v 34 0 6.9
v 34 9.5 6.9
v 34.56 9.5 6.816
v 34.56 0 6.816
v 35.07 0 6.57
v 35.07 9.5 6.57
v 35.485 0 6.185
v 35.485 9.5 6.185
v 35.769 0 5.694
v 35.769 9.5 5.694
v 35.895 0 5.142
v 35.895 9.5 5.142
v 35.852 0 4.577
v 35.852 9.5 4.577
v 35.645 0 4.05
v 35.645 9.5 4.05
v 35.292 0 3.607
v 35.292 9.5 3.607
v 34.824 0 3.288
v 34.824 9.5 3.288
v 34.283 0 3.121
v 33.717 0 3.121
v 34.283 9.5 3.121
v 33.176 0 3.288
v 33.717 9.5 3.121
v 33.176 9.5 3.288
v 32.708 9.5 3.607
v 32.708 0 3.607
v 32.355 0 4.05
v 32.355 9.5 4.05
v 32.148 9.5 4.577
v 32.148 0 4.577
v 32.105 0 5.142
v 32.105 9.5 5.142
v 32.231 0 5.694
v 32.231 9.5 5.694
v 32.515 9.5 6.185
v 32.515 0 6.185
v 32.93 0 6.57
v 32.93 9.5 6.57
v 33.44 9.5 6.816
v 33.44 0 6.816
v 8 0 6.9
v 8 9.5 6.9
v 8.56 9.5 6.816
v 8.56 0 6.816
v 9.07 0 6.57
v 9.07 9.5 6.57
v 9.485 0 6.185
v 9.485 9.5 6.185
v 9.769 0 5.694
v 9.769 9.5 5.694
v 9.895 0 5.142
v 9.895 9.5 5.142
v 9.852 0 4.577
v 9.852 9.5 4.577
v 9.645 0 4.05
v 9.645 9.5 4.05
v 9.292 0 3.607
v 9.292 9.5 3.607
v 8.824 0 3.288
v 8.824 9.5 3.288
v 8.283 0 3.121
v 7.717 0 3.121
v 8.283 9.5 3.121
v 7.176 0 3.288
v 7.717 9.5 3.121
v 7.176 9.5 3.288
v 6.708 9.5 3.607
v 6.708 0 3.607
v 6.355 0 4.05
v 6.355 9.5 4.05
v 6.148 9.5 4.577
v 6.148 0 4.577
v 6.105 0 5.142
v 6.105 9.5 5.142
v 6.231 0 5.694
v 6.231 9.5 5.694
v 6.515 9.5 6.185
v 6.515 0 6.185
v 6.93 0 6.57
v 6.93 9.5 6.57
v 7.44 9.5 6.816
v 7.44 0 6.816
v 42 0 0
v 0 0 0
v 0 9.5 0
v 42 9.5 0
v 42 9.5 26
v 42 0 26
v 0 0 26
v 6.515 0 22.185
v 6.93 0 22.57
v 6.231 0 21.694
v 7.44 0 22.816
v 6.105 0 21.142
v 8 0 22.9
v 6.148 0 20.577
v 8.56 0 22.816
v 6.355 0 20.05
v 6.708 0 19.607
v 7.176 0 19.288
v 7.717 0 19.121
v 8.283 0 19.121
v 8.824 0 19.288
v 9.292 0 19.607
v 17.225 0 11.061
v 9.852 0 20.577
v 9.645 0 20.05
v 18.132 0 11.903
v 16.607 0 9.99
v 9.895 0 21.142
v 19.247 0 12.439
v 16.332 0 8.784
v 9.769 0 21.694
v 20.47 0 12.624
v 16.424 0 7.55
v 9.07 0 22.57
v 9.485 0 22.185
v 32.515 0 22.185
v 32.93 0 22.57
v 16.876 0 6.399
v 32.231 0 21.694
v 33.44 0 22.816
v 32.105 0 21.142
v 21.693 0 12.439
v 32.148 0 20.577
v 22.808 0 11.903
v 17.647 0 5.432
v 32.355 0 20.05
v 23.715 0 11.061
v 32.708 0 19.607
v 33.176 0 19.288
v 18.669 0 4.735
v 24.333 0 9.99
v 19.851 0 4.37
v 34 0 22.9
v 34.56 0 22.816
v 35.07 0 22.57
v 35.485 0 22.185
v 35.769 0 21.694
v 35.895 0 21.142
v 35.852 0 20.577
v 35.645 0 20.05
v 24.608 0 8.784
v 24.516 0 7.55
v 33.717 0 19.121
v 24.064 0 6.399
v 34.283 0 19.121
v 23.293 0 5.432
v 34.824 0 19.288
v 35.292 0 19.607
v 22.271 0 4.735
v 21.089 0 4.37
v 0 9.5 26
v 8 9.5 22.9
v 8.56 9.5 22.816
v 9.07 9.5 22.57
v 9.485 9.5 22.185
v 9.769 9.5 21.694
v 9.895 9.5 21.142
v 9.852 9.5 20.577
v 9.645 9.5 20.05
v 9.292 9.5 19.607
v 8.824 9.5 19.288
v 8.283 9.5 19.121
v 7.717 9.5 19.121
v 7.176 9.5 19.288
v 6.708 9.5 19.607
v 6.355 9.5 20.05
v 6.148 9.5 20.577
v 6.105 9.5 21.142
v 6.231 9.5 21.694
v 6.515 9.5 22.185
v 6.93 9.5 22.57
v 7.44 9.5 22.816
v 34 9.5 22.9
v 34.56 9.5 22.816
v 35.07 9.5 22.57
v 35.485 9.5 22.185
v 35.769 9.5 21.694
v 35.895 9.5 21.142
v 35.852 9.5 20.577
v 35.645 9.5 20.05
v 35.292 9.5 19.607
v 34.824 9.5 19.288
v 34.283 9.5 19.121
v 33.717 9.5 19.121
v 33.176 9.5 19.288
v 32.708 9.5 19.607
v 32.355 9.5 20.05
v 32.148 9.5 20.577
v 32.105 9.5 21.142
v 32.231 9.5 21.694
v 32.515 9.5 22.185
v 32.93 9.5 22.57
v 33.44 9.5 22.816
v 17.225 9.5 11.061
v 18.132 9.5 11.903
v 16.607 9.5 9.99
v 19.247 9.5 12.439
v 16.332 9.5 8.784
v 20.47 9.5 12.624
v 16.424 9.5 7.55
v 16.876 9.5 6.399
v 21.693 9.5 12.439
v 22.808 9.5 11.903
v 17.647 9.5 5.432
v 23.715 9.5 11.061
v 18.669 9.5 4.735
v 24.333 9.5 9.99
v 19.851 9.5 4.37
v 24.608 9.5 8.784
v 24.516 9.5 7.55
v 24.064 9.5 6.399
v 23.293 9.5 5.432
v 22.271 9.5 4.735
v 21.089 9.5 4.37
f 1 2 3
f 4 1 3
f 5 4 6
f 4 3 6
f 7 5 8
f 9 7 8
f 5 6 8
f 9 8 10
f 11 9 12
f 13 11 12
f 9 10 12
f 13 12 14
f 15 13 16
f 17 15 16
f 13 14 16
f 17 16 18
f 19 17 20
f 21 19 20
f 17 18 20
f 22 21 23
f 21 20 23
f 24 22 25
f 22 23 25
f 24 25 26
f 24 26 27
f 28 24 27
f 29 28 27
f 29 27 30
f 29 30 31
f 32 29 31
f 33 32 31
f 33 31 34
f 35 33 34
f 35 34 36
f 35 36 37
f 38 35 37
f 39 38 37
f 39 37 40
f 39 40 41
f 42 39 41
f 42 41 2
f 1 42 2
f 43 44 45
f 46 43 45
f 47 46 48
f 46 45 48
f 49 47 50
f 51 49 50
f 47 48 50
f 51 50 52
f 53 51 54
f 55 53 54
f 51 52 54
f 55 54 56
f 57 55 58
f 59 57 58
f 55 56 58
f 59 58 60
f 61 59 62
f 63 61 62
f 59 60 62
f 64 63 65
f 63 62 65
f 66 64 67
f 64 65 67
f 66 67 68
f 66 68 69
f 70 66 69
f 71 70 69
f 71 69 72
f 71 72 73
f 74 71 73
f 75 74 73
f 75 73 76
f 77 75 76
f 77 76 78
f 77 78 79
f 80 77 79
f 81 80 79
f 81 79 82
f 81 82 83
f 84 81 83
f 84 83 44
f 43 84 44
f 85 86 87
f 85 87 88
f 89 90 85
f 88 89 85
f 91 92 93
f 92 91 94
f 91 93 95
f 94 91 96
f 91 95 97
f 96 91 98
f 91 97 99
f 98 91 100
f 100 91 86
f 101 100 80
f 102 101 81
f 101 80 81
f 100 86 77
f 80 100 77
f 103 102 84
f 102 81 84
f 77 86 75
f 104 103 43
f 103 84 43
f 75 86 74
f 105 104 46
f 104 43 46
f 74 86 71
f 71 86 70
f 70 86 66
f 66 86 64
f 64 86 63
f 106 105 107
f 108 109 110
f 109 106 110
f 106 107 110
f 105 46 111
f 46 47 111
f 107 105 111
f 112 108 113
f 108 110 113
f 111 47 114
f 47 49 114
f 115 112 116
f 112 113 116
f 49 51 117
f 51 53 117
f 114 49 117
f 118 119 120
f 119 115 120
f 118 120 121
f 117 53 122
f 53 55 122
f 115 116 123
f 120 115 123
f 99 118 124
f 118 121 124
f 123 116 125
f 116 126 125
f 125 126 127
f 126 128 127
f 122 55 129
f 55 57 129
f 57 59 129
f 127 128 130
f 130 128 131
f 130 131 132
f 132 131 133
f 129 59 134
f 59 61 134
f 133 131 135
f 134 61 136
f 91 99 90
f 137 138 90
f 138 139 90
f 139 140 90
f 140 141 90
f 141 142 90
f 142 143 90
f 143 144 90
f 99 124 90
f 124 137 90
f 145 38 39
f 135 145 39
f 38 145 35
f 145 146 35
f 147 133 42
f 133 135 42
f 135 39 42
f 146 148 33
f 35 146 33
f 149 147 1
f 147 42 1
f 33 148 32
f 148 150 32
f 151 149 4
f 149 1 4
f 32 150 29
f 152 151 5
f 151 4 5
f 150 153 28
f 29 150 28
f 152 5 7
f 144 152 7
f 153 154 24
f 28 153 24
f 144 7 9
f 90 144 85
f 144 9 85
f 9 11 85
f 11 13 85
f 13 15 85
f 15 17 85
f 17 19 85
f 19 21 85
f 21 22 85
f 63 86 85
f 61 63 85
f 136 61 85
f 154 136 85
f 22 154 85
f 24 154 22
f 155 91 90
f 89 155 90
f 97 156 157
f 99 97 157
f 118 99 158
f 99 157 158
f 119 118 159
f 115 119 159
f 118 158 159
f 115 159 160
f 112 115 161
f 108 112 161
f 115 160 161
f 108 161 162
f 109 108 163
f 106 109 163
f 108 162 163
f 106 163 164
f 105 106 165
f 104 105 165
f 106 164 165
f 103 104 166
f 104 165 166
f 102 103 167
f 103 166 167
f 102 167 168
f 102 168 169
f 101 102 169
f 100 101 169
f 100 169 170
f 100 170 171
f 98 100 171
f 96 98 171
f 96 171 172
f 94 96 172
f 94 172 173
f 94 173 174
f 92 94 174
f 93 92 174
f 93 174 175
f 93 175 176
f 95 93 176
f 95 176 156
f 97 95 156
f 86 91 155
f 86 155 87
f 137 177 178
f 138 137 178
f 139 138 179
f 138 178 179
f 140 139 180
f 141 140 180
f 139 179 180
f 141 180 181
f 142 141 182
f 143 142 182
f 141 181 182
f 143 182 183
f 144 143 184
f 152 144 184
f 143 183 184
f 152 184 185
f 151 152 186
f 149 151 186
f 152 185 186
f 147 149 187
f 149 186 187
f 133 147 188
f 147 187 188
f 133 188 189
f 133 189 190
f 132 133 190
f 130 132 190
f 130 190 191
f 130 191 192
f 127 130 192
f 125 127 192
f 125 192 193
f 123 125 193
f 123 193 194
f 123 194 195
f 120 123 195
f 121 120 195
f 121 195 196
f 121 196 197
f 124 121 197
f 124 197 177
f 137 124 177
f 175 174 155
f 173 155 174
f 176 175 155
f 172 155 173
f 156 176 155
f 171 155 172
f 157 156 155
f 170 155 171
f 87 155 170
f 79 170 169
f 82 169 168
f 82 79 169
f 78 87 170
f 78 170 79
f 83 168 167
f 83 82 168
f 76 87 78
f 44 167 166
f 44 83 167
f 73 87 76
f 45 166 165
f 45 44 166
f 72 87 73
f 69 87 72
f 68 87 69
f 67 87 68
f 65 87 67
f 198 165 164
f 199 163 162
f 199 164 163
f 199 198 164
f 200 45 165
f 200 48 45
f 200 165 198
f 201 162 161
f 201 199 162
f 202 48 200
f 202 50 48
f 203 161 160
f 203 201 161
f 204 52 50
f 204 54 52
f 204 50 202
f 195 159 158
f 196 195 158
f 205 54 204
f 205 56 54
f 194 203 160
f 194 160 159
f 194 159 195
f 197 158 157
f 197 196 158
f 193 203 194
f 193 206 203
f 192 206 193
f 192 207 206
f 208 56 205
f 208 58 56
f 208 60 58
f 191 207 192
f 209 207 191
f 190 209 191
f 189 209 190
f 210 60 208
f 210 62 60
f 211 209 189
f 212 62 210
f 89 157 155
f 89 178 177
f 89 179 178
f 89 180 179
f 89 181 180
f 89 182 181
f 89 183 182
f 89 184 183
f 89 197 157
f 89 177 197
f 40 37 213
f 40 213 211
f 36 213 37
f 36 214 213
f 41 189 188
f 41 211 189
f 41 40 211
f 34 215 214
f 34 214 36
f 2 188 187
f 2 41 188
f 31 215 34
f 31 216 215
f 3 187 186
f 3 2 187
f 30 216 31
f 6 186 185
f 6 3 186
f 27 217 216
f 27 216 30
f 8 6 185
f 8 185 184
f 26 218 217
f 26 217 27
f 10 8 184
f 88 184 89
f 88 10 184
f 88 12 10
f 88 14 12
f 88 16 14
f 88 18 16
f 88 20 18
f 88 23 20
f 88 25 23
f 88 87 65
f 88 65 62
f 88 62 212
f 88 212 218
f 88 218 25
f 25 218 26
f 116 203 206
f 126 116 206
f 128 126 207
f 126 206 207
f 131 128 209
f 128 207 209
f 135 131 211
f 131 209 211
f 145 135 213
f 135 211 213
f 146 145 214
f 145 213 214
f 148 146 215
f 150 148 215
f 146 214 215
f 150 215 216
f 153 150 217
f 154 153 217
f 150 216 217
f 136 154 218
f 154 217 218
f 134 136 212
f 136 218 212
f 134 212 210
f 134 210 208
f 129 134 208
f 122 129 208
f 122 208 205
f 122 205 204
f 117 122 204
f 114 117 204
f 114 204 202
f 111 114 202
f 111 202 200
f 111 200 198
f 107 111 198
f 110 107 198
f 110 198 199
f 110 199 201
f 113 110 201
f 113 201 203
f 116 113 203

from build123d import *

# Parameters (mm, degrees)
SKETCH_1_W          = 42
SKETCH_1_H          = 26
EXTRUDE_1_DEPTH     = 9.5
SKETCH_3_R          = 4.15
CUT_EXTRUDE_1_DEPTH = 51.301590432
SKETCH_4_R          = 1.9
CUT_EXTRUDE_2_DEPTH = 51.301590432


with BuildPart() as part:
    # 草图1 → 凸台-拉伸1 (new body)
    with BuildSketch(Plane(origin=(0, 0, 0), x_dir=(1, 0, 0), z_dir=(0, 1, 0))):
        with Locations((21, -13)):
            Rectangle(SKETCH_1_W, SKETCH_1_H)
    extrude(amount=EXTRUDE_1_DEPTH)

    # 草图3 → 切除-拉伸1 (cut, through all)
    with BuildSketch(Plane(origin=(0, 9.5, 0), x_dir=(1, 0, 0), z_dir=(0, 1, 0))):
        with Locations(Location((20.47, -8.473805396, 0), (0, 0, 270))):
            Circle(SKETCH_3_R)
    extrude(amount=-CUT_EXTRUDE_1_DEPTH, mode=Mode.SUBTRACT)

    # 草图4 → 切除-拉伸2 (cut, through all)
    with BuildSketch(Plane(origin=(0, 9.5, 0), x_dir=(1, 0, 0), z_dir=(0, 1, 0))):
        with Locations(Location((8, -5, 0), (0, 0, 270))):
            Circle(SKETCH_4_R)
        with Locations(Location((8, -21, 0), (0, 0, 270))):
            Circle(SKETCH_4_R)
        with Locations(Location((34, -5, 0), (0, 0, 270))):
            Circle(SKETCH_4_R)
        with Locations(Location((34, -21, 0), (0, 0, 270))):
            Circle(SKETCH_4_R)
    extrude(amount=-CUT_EXTRUDE_2_DEPTH, mode=Mode.SUBTRACT)


solid = part.part
